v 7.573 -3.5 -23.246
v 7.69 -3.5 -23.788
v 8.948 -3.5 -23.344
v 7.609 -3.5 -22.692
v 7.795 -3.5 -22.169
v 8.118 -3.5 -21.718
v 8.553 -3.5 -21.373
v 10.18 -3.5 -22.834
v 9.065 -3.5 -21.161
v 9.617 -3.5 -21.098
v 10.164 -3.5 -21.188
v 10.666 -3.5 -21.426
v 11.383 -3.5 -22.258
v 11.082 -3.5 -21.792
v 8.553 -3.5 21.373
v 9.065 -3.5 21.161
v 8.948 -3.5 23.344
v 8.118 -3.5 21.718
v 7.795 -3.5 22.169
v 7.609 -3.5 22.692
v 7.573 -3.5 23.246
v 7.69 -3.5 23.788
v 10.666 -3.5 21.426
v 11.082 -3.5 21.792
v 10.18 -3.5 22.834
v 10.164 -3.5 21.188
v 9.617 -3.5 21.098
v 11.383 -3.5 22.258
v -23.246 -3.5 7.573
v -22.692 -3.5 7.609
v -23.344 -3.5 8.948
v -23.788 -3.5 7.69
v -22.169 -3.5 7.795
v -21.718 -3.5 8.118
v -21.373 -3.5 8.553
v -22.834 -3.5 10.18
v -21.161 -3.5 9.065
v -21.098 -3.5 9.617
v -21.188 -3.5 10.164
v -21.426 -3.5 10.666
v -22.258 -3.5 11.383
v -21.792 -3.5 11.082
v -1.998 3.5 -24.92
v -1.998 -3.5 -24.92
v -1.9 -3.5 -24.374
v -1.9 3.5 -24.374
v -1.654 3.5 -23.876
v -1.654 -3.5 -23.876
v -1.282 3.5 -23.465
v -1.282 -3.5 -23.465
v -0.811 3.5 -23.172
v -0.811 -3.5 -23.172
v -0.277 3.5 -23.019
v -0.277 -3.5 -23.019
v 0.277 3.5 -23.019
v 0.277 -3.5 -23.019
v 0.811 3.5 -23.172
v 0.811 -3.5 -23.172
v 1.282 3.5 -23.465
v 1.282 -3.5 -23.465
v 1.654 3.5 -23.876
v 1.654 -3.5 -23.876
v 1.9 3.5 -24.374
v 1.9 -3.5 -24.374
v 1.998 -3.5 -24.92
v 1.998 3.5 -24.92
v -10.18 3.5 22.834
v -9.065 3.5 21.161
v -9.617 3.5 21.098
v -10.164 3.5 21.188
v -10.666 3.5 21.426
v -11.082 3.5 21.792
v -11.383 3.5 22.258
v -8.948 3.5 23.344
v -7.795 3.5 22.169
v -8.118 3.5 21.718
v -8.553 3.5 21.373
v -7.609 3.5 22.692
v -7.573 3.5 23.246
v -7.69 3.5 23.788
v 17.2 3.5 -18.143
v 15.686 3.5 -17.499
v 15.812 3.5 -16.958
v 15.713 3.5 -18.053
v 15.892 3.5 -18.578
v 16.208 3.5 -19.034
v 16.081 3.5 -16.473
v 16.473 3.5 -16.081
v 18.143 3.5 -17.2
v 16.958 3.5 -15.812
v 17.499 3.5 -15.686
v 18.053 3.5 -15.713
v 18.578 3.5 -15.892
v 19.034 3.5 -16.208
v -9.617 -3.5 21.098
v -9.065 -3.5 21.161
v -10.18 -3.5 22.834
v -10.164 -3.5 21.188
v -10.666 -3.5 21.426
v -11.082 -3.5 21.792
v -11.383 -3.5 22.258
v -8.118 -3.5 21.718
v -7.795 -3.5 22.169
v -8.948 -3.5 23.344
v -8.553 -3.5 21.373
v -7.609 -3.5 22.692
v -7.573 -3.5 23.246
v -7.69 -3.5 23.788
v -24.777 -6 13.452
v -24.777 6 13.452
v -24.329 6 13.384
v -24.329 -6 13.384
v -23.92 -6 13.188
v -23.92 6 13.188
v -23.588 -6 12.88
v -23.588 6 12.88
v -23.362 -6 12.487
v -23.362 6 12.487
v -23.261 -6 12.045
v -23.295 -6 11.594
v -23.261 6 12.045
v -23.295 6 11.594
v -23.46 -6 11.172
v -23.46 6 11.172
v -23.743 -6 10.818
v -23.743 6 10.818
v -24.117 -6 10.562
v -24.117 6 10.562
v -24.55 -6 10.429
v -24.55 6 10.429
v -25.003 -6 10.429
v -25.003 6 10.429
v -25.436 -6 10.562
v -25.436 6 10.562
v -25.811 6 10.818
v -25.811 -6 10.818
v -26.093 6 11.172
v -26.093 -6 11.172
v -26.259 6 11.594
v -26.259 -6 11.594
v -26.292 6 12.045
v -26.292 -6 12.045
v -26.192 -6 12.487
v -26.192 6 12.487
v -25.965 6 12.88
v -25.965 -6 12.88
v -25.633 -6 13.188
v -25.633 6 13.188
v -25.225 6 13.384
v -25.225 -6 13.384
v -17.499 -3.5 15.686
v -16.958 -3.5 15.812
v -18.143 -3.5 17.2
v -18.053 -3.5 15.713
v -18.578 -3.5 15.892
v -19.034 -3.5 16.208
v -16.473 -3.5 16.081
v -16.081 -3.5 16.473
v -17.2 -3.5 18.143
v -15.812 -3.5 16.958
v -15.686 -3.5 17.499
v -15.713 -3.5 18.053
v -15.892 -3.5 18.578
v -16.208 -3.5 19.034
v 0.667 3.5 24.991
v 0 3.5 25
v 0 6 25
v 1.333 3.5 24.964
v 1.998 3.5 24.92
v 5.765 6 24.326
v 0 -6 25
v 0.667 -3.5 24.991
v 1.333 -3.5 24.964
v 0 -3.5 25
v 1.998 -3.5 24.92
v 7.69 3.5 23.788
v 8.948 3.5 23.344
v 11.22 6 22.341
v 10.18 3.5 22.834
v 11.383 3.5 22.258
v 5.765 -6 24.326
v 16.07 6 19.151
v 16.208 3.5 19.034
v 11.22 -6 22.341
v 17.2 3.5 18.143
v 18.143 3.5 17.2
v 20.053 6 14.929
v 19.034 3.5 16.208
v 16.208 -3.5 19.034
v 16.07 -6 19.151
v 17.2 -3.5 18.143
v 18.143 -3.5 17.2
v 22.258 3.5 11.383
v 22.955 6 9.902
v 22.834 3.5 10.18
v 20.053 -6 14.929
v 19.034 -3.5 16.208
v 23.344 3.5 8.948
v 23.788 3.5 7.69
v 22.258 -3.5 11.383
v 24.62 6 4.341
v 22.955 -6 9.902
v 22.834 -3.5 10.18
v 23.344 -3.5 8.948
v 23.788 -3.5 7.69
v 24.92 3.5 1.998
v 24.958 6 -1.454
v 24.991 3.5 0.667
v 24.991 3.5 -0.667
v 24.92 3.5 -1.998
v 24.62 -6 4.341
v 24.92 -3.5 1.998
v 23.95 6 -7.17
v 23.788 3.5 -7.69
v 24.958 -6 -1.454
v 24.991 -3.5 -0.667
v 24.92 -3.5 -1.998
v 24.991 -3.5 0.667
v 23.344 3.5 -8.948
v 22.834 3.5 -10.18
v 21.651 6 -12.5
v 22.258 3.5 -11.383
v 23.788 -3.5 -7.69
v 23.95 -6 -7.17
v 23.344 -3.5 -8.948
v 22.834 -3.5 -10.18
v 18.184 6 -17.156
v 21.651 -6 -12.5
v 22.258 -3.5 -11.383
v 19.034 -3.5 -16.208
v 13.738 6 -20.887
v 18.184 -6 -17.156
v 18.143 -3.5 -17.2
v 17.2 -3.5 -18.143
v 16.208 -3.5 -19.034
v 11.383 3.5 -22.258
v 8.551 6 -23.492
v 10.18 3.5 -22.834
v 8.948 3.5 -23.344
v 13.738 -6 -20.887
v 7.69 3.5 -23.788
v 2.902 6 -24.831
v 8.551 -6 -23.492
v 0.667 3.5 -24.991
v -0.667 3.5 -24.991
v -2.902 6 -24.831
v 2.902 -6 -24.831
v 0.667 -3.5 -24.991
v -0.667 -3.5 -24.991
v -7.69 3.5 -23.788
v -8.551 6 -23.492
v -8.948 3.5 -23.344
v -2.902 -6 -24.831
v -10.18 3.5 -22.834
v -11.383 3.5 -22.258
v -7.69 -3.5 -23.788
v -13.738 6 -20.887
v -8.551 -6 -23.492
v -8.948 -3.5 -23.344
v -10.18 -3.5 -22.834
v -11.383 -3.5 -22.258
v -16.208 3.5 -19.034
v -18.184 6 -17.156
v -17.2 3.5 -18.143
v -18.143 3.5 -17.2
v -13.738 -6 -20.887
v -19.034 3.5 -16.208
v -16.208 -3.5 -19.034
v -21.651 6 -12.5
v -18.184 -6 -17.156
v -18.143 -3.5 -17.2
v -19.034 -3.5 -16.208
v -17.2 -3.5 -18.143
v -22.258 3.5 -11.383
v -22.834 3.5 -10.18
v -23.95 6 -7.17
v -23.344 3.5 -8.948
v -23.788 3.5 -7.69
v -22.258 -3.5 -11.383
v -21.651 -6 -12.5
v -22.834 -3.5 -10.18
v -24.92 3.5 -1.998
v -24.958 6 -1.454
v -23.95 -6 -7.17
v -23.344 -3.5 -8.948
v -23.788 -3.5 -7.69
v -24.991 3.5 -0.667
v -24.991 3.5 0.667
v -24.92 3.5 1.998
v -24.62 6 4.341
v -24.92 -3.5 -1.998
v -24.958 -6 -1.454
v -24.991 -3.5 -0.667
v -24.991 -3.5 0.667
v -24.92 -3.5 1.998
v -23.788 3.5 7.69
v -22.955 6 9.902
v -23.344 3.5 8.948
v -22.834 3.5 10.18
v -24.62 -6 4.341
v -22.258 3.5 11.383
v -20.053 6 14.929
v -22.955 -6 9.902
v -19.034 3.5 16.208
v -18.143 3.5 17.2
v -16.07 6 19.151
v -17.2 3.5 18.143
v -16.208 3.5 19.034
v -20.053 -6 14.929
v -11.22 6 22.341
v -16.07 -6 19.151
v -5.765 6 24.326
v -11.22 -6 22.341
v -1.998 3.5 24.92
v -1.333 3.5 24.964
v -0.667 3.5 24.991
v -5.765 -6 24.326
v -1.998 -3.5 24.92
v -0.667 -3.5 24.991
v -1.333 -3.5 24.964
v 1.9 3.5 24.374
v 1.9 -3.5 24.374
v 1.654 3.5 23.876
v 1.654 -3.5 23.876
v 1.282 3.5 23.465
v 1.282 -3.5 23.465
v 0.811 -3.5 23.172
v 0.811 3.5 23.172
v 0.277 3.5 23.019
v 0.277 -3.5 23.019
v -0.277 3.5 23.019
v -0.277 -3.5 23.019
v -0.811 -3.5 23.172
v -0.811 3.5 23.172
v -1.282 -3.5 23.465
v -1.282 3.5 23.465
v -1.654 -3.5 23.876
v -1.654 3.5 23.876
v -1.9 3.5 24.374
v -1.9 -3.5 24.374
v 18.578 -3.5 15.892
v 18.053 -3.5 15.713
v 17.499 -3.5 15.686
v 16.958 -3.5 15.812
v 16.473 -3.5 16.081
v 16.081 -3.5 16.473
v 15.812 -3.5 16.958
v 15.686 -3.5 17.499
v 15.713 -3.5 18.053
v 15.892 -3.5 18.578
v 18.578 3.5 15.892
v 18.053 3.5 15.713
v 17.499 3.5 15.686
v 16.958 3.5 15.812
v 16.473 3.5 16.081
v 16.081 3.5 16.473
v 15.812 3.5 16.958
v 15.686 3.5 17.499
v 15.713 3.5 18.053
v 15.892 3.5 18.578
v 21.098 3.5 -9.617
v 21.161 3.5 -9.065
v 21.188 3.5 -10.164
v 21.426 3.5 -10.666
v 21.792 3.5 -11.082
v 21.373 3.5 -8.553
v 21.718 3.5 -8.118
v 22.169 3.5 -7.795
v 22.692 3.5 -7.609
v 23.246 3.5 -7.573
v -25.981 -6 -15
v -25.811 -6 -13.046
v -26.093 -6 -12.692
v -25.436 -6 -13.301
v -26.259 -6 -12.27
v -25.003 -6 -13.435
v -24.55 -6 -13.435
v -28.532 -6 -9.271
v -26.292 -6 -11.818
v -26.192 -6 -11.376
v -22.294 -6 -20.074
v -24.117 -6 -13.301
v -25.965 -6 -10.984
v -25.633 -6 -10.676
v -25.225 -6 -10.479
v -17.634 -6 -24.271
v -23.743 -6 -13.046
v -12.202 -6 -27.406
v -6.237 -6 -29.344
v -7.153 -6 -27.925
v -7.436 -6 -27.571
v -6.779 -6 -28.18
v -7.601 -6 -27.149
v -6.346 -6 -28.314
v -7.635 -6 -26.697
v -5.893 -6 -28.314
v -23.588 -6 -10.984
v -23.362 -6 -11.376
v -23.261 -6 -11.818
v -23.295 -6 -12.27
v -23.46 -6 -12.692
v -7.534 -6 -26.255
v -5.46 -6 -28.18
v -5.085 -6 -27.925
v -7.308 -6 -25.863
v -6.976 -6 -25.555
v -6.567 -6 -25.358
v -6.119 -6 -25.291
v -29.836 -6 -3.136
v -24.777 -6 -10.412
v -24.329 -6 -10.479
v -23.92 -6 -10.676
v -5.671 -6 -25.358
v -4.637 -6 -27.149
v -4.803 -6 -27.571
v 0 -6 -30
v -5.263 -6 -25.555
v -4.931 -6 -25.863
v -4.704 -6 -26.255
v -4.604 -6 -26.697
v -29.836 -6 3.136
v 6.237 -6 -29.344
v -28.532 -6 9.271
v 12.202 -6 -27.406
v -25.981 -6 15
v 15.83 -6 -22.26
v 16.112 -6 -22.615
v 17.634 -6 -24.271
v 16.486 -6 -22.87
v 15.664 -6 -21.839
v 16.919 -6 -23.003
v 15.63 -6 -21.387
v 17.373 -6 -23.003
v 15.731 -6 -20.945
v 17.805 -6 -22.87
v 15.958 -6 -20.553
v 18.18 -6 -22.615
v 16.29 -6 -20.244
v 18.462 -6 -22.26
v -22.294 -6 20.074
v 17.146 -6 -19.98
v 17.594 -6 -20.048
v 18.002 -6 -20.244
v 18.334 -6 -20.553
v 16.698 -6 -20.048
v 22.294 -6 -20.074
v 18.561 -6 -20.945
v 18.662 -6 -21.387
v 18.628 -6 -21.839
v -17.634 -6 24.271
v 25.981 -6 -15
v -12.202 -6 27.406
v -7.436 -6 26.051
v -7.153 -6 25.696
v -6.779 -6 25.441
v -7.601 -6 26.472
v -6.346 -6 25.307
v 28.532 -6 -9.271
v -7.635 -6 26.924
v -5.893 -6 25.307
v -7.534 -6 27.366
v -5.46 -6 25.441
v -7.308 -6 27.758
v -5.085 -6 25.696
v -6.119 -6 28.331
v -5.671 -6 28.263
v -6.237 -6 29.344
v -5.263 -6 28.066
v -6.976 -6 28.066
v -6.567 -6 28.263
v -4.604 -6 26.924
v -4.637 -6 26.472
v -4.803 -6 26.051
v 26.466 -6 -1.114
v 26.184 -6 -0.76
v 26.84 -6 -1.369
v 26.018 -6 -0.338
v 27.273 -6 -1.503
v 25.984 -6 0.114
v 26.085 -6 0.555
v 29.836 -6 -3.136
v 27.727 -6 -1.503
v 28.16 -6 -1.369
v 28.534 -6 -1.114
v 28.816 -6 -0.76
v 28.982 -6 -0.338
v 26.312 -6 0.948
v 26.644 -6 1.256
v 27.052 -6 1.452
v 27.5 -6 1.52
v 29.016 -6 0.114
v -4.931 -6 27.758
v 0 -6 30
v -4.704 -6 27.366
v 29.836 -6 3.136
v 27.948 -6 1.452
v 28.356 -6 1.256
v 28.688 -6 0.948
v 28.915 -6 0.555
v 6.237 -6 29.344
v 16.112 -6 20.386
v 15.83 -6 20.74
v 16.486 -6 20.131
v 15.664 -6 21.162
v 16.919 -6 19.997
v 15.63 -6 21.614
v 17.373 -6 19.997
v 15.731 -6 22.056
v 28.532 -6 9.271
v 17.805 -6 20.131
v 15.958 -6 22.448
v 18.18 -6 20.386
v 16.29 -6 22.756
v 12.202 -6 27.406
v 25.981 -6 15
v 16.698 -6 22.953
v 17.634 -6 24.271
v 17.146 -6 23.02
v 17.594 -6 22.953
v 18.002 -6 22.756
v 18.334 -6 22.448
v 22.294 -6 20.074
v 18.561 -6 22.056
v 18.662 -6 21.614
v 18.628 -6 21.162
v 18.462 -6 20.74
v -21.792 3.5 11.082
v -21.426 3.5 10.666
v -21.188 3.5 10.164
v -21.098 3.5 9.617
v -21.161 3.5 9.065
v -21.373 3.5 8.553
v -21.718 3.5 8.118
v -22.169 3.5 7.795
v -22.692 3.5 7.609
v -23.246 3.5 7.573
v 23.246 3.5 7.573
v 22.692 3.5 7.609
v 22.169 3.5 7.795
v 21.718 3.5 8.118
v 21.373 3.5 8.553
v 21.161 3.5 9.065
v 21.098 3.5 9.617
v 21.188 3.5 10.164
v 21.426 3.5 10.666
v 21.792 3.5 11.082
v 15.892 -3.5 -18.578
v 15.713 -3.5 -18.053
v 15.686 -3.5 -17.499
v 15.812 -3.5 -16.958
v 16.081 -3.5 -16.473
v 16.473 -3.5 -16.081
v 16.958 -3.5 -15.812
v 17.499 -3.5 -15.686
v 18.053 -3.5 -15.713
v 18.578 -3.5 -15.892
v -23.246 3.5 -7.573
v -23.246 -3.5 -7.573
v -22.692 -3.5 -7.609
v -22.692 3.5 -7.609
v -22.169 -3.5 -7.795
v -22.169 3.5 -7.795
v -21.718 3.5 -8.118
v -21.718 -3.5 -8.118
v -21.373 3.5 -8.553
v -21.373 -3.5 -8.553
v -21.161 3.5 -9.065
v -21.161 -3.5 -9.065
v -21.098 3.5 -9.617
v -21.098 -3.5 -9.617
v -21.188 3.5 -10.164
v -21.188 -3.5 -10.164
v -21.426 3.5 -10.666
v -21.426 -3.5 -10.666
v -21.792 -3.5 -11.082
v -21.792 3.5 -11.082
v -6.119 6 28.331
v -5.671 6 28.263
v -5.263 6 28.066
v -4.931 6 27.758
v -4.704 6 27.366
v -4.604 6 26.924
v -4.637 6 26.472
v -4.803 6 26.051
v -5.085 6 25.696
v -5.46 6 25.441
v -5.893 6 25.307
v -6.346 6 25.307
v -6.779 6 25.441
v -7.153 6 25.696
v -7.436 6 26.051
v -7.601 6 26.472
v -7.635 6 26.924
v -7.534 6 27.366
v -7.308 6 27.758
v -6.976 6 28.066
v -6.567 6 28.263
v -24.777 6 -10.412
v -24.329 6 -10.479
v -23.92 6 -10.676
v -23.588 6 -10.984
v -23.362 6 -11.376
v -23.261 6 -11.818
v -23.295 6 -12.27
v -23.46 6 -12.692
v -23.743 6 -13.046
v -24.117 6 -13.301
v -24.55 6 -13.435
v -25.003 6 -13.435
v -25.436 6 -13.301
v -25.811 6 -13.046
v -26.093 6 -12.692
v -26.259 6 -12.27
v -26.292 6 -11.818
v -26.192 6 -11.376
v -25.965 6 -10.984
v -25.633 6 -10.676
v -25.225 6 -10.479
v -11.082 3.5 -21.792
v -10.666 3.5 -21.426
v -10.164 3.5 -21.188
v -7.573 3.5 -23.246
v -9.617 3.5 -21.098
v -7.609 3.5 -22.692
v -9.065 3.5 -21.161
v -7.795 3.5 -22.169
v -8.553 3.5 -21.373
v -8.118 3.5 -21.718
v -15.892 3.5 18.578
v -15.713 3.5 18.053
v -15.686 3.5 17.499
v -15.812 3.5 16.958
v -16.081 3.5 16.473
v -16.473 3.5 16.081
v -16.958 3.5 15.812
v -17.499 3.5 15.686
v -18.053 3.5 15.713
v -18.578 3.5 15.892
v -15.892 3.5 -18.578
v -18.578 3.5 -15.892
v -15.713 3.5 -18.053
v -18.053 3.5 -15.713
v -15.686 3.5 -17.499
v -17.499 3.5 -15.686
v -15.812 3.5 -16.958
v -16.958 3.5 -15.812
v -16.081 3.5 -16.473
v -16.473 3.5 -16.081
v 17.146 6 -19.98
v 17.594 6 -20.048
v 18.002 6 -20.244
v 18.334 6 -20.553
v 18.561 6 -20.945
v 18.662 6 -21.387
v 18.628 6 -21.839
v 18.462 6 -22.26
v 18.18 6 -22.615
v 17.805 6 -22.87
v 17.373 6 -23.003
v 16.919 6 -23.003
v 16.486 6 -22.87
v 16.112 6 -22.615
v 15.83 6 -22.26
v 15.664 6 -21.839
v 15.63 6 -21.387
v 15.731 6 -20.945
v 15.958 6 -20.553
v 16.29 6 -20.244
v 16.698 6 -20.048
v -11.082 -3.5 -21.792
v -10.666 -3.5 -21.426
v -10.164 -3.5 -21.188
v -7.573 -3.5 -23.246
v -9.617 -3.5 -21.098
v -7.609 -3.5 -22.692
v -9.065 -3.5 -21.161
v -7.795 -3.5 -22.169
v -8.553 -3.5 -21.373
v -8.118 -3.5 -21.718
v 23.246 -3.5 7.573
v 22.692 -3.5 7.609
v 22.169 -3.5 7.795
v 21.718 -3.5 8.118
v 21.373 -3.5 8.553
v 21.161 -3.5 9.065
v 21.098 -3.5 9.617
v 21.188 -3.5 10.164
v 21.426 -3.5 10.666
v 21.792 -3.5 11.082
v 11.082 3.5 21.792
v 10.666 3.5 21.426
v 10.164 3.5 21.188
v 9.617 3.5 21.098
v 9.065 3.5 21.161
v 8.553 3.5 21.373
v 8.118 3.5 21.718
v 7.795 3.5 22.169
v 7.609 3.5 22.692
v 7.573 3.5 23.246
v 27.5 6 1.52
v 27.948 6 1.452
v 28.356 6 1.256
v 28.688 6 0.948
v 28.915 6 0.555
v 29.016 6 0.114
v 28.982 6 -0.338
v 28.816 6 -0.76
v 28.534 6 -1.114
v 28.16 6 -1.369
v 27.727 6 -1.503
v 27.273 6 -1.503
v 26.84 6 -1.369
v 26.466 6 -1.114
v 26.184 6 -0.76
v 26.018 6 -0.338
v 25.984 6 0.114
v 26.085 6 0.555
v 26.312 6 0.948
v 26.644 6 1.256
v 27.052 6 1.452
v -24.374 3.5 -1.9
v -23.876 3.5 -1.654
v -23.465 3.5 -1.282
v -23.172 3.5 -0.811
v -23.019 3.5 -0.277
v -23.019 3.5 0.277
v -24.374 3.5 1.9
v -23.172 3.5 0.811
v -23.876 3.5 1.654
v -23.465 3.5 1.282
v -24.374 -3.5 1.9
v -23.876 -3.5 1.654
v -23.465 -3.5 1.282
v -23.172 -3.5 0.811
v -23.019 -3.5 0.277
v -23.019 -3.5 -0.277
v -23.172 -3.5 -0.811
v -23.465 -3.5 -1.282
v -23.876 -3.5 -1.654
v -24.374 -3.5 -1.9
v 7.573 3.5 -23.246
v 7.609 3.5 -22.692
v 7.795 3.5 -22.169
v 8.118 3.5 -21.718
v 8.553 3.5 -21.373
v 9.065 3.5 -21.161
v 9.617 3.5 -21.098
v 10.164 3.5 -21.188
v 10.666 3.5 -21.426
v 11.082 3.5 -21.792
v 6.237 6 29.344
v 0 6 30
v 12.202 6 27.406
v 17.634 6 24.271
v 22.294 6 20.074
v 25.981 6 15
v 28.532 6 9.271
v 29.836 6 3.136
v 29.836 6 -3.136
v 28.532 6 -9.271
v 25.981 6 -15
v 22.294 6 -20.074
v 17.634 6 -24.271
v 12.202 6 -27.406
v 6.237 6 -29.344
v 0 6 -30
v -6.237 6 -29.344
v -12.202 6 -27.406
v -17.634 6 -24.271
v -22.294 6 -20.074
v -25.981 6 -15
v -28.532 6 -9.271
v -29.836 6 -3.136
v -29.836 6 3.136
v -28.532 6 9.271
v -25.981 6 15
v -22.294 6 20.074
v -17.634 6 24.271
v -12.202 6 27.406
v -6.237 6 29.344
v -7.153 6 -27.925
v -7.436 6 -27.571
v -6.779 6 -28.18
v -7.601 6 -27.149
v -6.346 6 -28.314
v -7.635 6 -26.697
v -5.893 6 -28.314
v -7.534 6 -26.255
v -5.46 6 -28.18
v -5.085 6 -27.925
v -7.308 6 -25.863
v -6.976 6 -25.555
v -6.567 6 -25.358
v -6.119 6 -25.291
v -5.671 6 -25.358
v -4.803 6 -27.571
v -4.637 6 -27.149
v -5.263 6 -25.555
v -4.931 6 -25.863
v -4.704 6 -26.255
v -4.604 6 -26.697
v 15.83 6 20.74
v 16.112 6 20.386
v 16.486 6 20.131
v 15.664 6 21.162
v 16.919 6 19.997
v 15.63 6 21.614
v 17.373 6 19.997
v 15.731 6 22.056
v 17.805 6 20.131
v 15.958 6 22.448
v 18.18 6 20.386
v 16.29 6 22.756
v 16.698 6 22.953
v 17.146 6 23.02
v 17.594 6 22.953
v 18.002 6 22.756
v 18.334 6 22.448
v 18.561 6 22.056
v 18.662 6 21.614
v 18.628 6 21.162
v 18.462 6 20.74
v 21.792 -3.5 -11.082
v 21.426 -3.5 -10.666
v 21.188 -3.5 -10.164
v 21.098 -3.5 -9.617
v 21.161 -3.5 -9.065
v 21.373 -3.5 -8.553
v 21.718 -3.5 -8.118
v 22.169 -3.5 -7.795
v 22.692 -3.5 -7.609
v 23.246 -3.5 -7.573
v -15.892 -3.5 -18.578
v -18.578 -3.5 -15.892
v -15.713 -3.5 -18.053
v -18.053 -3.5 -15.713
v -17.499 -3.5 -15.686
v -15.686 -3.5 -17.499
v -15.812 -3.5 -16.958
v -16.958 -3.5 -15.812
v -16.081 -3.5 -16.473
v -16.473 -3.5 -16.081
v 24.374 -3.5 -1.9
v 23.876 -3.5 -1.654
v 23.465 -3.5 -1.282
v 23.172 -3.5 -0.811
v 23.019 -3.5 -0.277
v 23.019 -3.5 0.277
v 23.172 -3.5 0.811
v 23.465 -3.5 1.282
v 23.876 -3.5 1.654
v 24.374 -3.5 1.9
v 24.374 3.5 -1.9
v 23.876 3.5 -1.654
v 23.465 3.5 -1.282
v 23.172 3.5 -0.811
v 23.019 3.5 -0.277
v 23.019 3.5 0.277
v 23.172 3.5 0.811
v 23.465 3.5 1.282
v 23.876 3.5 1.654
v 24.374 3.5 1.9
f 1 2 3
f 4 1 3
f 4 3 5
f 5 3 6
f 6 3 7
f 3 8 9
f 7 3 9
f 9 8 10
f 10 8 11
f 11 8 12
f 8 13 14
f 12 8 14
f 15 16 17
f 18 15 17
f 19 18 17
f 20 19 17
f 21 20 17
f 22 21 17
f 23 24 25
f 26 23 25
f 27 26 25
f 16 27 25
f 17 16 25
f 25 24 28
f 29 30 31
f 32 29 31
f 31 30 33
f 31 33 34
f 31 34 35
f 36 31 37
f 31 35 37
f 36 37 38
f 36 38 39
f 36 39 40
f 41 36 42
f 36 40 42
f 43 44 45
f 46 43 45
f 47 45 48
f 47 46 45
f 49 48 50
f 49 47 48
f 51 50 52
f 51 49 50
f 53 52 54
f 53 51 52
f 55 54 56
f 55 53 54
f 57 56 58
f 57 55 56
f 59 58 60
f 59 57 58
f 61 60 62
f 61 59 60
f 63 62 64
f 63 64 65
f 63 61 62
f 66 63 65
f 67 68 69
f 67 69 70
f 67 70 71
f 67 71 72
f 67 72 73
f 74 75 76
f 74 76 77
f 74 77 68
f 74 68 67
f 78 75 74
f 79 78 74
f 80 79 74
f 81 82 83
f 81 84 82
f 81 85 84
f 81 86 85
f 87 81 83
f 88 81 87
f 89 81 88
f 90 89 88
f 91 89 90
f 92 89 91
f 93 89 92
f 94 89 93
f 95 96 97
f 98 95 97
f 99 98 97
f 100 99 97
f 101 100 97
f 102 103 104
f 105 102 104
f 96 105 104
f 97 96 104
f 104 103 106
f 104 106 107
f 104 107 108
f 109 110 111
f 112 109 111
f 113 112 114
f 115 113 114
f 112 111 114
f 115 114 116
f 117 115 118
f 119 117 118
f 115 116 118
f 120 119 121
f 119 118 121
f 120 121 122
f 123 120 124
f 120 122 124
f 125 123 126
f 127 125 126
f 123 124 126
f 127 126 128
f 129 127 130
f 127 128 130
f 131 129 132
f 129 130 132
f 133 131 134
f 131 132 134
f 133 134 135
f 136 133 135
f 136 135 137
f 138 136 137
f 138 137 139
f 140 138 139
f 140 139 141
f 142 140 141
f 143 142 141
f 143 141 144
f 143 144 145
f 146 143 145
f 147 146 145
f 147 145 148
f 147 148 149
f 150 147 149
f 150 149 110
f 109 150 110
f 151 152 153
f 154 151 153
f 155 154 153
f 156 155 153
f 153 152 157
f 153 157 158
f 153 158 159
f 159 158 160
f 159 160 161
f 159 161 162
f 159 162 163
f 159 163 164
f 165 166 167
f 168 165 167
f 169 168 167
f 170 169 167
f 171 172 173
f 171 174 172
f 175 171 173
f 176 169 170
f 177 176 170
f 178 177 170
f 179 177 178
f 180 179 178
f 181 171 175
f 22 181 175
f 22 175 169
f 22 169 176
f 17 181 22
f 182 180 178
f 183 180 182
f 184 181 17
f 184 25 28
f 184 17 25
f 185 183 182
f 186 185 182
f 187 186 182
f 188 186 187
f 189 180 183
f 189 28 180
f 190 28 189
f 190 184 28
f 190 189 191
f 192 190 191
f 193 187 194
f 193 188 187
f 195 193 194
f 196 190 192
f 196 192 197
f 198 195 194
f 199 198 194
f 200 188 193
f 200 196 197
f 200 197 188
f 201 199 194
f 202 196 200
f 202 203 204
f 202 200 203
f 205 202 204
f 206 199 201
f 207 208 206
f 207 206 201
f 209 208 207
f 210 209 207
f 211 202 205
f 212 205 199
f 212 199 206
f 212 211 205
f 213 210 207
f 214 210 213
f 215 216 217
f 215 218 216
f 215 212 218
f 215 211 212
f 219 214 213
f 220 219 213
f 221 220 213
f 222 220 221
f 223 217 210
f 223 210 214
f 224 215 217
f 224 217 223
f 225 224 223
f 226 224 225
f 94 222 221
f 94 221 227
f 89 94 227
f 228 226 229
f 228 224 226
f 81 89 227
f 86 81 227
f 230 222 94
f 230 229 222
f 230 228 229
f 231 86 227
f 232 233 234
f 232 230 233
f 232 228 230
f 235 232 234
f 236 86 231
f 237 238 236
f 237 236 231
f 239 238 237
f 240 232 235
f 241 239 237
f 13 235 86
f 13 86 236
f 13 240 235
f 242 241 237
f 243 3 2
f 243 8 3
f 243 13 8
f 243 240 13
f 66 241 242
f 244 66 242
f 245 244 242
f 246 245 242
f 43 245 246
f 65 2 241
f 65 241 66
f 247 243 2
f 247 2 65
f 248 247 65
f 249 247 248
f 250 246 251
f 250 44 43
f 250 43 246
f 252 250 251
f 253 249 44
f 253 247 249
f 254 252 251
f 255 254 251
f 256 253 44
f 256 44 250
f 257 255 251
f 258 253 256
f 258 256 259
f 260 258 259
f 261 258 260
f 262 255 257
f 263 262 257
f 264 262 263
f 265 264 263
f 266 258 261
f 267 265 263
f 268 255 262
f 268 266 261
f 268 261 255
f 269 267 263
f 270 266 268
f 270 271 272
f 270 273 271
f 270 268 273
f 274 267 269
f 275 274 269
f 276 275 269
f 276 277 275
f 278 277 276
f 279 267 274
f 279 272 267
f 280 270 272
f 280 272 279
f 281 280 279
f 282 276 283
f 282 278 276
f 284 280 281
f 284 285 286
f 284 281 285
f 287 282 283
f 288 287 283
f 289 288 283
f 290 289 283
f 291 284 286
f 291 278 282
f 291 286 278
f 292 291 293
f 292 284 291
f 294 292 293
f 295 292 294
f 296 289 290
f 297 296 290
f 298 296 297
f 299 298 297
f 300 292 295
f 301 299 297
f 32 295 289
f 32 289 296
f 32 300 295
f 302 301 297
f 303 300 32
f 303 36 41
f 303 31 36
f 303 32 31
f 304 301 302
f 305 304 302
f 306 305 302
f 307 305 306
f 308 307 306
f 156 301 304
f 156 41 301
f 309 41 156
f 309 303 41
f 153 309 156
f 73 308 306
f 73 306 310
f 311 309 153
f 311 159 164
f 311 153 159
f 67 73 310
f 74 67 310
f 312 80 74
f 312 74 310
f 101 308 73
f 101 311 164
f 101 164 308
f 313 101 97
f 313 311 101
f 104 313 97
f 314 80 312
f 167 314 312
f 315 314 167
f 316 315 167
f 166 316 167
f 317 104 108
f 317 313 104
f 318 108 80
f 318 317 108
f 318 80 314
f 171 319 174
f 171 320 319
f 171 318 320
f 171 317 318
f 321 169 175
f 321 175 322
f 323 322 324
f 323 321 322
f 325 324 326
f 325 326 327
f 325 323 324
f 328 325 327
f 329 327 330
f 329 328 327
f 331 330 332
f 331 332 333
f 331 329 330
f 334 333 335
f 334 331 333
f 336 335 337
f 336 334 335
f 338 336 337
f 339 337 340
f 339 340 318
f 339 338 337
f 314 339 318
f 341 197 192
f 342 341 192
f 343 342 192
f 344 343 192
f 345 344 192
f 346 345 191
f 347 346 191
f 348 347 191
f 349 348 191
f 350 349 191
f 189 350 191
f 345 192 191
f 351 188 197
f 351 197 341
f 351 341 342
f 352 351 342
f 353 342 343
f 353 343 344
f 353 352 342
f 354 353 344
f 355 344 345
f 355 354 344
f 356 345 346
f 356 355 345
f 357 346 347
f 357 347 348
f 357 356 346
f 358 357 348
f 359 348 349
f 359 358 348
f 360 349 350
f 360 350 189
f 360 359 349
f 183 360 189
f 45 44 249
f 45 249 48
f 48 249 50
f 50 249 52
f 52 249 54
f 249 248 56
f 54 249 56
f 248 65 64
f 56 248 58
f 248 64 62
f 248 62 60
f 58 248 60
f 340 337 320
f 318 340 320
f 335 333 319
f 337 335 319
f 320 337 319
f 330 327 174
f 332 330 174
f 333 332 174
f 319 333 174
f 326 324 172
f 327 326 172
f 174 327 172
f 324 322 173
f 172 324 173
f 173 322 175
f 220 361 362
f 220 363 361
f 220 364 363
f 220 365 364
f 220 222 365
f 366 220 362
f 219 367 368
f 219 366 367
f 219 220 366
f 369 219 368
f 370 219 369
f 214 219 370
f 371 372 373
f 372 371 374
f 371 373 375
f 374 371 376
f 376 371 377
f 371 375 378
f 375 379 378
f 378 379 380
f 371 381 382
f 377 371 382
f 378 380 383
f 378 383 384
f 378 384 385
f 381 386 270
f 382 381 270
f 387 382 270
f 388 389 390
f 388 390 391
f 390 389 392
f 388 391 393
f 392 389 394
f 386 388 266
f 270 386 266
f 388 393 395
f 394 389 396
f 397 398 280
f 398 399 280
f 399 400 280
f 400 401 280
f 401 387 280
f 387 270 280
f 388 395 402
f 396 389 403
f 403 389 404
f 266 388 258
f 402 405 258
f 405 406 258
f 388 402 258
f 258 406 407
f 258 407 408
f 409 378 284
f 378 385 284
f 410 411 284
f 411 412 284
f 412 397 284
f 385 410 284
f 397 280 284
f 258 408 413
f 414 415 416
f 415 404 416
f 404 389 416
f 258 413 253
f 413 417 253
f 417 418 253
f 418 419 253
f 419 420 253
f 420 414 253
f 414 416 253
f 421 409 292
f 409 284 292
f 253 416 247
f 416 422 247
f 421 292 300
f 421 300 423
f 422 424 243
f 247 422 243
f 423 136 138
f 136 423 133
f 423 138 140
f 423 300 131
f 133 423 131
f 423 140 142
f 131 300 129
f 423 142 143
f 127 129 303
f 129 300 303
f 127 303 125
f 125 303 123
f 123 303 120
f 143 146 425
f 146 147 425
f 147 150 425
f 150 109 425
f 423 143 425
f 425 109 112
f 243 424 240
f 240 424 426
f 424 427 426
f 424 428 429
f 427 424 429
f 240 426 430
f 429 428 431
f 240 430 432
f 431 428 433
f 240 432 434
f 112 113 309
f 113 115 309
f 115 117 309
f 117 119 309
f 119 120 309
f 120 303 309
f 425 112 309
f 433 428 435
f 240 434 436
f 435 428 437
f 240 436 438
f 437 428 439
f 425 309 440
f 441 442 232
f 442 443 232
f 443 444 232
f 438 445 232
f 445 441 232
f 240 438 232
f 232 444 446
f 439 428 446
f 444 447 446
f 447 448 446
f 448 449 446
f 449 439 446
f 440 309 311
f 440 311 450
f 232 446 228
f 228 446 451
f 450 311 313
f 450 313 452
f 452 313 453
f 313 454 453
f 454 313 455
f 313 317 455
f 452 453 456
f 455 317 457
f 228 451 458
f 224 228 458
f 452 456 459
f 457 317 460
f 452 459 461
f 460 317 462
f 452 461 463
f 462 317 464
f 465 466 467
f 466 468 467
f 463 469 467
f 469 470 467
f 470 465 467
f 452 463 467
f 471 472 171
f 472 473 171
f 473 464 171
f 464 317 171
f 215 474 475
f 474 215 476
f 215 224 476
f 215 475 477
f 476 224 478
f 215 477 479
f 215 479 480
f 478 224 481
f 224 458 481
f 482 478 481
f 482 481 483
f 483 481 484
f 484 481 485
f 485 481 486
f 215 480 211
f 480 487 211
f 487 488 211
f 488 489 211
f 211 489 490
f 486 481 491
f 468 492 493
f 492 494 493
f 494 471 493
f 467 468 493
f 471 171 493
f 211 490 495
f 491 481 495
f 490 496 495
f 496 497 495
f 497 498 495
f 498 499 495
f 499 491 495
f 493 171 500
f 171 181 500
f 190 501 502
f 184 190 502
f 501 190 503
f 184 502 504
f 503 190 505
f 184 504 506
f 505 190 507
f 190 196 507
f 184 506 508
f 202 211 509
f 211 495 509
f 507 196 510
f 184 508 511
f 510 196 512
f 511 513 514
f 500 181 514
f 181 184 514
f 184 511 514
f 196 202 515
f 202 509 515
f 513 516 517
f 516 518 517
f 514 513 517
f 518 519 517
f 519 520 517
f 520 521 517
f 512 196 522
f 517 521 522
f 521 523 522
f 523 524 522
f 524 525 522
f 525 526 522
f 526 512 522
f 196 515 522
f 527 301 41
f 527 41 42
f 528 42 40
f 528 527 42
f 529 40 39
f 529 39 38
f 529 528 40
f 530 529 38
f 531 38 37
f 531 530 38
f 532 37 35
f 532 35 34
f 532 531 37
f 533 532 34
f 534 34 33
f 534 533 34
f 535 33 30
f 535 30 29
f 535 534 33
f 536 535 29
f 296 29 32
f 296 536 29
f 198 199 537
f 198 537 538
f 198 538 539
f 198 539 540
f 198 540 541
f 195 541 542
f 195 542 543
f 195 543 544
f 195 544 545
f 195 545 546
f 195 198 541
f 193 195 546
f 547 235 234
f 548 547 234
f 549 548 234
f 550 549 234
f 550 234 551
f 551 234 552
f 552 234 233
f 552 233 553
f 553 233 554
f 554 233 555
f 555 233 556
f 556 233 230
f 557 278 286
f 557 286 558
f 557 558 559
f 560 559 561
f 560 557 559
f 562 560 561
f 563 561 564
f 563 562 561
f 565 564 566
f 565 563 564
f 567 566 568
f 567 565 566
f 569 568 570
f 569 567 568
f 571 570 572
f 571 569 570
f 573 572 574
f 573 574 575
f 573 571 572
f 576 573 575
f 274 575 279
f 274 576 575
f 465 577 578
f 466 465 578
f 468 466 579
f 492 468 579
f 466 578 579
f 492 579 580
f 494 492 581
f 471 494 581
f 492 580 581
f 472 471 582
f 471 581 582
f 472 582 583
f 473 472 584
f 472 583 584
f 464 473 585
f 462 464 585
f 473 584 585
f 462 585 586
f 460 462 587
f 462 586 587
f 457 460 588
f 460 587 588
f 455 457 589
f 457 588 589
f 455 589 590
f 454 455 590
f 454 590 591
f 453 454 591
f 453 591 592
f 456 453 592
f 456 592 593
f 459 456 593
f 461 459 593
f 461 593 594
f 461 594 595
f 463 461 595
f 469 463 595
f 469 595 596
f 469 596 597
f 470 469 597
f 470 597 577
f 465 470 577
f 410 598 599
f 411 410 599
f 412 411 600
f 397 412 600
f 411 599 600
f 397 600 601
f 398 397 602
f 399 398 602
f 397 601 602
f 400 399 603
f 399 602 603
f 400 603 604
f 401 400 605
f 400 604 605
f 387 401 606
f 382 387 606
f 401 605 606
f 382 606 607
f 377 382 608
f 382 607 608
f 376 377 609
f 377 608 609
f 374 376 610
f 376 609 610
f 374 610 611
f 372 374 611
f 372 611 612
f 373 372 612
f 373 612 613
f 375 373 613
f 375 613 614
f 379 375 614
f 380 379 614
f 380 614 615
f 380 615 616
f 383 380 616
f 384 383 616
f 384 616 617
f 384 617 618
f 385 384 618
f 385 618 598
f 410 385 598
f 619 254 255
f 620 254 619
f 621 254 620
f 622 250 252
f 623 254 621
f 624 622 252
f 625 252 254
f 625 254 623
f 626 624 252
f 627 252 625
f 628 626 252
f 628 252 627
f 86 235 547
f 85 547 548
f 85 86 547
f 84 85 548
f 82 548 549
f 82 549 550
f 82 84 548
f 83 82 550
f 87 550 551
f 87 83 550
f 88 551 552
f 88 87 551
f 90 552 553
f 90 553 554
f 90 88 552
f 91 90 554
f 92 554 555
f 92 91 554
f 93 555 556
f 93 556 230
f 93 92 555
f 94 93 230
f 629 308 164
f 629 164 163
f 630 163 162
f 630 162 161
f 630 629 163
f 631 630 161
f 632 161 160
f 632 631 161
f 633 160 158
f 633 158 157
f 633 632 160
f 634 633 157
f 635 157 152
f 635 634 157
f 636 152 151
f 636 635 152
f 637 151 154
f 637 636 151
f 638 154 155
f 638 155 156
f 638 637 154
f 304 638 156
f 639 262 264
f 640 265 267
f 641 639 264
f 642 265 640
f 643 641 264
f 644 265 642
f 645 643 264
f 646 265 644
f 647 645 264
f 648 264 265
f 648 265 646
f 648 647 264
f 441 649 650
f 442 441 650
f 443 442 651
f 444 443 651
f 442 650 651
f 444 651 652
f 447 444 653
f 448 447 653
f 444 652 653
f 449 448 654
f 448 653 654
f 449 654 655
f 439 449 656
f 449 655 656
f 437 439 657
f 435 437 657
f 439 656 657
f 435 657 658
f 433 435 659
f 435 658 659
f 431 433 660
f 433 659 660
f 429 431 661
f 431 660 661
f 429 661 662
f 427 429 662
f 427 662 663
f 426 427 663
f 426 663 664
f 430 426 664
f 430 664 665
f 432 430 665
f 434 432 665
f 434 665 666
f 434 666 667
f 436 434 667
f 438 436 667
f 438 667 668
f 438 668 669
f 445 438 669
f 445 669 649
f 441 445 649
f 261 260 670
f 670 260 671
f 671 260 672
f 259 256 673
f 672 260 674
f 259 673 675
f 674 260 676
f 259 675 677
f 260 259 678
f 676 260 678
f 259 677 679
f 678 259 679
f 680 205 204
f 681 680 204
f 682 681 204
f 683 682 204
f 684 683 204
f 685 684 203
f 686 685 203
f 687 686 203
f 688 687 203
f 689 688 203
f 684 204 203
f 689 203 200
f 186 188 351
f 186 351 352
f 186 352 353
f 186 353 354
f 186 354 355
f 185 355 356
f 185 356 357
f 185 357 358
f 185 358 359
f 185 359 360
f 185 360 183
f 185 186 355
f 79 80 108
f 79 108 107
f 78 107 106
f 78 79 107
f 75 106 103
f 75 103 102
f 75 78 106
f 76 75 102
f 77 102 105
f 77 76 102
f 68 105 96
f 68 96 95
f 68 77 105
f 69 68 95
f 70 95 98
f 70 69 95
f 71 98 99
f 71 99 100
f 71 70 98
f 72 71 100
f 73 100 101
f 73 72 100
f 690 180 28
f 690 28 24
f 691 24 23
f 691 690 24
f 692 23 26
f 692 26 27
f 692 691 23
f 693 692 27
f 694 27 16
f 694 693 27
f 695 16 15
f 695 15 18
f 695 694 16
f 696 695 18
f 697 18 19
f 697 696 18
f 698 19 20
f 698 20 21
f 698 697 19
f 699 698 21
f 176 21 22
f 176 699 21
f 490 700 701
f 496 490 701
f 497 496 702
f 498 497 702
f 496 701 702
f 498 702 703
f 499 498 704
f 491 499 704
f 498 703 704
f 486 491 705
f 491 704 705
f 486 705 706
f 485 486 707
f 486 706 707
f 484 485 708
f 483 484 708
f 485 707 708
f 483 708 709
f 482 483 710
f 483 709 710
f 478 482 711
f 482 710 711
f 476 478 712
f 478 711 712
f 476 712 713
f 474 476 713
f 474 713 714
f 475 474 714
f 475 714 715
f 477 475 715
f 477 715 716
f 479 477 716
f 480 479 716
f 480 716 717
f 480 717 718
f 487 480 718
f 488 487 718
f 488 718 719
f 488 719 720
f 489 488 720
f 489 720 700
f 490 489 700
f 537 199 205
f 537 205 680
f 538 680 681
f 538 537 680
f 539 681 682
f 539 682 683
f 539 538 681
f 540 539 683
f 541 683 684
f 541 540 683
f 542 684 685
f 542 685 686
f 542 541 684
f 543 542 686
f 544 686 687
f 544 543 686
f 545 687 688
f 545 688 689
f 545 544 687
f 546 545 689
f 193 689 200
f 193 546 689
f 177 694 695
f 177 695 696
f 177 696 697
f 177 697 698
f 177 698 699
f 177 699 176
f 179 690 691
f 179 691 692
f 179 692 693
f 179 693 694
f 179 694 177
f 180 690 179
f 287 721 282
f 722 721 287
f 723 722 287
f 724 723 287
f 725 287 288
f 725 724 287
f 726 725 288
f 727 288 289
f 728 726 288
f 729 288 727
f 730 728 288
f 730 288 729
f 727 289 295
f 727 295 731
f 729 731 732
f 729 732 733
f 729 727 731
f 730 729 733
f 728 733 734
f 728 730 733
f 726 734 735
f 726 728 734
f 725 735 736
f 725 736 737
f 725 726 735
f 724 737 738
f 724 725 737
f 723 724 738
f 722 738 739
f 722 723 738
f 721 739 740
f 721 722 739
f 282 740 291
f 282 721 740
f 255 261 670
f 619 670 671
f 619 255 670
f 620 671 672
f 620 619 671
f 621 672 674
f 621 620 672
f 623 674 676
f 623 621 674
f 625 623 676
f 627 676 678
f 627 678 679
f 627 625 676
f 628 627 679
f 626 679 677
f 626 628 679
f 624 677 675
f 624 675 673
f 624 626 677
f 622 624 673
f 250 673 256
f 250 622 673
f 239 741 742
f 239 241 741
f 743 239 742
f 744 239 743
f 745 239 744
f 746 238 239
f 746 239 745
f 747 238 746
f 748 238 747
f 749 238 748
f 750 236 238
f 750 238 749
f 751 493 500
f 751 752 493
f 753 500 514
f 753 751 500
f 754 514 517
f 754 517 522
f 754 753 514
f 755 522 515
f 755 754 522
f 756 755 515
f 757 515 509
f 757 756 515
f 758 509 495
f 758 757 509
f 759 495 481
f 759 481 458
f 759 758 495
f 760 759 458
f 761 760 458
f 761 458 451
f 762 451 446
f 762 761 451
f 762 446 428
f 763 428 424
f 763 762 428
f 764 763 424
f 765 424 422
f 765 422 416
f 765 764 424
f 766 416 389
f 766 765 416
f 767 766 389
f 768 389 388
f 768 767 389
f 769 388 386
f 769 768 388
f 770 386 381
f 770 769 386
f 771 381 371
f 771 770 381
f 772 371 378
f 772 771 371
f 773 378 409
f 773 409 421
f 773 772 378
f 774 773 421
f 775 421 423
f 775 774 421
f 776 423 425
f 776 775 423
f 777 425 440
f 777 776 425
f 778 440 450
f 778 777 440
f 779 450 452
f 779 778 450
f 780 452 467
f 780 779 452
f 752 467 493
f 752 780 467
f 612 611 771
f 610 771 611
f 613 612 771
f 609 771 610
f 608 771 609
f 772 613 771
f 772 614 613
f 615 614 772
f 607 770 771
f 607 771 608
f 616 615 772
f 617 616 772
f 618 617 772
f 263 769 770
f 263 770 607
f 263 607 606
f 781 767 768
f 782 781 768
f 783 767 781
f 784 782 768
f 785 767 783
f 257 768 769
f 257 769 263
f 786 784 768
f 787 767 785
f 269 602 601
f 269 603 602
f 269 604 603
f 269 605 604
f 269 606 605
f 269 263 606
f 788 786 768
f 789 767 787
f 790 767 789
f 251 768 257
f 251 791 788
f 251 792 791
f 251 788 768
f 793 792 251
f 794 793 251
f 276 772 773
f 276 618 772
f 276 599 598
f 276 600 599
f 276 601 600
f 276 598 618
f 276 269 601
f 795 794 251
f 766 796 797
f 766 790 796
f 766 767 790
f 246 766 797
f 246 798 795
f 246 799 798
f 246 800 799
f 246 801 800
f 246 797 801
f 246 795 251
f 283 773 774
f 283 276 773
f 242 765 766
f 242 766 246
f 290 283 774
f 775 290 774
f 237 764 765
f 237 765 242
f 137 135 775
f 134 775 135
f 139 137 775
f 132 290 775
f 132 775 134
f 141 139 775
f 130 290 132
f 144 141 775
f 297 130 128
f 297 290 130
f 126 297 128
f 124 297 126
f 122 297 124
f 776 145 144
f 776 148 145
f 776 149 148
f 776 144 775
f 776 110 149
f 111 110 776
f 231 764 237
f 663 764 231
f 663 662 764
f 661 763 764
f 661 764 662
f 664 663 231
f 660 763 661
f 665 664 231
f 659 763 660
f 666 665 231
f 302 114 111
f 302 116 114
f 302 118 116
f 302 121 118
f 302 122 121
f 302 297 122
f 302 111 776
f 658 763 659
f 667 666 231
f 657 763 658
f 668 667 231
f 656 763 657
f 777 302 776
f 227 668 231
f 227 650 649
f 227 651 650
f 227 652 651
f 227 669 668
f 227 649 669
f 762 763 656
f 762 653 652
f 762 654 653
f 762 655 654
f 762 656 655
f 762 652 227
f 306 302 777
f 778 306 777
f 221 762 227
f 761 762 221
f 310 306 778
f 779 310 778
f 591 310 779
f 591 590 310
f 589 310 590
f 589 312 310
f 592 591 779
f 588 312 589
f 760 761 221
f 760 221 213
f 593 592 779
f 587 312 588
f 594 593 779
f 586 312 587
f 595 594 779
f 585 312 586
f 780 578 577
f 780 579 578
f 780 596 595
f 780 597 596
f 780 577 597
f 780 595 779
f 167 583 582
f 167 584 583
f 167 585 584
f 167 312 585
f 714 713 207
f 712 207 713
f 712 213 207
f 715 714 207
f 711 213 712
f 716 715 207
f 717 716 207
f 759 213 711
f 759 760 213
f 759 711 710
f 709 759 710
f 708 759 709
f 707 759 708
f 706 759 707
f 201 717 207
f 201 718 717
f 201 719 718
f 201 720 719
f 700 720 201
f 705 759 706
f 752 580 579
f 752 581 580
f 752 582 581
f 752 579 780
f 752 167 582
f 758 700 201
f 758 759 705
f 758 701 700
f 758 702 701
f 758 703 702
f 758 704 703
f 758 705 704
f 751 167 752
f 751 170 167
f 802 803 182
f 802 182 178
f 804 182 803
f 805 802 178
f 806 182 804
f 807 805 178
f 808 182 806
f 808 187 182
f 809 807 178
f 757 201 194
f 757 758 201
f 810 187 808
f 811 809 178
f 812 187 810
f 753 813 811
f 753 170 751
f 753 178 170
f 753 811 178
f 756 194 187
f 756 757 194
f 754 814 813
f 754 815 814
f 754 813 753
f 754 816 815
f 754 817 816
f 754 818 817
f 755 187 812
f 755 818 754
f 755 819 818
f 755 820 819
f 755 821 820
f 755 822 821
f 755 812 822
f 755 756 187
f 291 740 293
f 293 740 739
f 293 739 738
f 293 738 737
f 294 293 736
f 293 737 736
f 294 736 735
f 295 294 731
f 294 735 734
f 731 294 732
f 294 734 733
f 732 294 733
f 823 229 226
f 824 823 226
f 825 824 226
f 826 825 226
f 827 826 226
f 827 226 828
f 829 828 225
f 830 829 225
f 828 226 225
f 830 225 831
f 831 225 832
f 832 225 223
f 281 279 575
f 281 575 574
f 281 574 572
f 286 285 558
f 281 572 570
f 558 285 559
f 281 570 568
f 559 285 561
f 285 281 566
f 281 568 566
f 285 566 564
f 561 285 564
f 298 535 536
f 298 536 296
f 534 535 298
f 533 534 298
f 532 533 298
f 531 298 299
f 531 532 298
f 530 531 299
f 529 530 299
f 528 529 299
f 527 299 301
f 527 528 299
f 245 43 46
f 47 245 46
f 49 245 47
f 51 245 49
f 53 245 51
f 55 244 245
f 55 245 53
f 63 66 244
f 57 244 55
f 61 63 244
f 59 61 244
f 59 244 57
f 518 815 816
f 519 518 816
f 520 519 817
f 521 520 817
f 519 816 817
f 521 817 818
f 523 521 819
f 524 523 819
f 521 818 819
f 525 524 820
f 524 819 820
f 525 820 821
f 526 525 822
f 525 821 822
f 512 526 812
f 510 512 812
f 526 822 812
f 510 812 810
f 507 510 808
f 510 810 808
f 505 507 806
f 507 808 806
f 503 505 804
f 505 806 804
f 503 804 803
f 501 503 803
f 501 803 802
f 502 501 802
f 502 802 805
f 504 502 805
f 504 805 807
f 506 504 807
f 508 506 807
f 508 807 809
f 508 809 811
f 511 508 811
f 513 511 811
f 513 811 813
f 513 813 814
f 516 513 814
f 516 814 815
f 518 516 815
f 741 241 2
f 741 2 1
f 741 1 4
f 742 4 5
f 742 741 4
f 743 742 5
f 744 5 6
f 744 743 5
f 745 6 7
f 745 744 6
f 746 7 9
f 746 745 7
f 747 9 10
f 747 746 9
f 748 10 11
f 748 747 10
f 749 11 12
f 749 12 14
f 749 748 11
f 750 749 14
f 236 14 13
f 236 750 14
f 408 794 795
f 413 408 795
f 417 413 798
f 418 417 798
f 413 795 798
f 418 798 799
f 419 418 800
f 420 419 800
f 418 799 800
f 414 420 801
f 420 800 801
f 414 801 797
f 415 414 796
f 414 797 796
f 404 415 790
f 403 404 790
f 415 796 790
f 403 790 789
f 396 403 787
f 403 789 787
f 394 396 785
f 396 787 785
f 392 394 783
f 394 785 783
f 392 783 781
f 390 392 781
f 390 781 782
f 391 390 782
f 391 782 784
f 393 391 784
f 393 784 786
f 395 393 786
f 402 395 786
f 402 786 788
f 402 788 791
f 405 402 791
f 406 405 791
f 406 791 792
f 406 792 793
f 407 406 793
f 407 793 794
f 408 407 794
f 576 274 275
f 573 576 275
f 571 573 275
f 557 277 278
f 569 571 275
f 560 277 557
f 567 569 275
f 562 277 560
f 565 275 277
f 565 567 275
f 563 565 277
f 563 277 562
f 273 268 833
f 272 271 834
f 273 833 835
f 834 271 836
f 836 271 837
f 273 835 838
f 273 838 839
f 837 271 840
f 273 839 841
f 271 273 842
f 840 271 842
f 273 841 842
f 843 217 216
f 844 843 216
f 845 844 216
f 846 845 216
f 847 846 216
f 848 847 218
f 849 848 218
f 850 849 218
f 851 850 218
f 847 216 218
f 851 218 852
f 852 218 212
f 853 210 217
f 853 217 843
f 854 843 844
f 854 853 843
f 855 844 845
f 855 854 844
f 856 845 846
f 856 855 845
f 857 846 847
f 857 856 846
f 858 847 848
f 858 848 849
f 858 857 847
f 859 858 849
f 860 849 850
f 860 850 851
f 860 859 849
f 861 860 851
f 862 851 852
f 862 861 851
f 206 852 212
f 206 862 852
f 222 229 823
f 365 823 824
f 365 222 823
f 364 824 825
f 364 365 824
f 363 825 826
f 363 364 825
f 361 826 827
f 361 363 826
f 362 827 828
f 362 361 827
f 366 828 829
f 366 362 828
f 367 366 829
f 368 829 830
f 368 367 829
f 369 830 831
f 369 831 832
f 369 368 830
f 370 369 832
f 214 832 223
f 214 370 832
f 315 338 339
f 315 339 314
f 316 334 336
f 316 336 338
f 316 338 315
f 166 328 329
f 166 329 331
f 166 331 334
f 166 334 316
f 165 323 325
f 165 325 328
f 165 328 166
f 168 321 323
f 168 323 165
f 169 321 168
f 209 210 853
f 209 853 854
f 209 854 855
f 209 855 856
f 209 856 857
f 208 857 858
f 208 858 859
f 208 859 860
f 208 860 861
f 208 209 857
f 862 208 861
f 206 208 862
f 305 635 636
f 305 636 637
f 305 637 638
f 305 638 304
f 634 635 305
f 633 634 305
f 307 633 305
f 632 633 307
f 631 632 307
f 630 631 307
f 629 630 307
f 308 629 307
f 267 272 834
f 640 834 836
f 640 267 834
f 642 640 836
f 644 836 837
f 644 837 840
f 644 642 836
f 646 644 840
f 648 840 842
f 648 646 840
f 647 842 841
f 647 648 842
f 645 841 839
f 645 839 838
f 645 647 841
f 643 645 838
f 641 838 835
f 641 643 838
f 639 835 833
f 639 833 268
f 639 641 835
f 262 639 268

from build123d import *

# Parameters (mm, degrees)
CROQUIS1_R                 = 2
SALIENTE_EXTRUIR1_DEPTH    = 3.5
SALIENTE_EXTRUIR1_2_DEPTH  = 3.5
SALIENTE_EXTRUIR1_3_DEPTH  = 3.5
SALIENTE_EXTRUIR1_4_DEPTH  = 3.5
SALIENTE_EXTRUIR1_5_DEPTH  = 3.5
SALIENTE_EXTRUIR1_6_DEPTH  = 3.5
SALIENTE_EXTRUIR1_7_DEPTH  = 3.5
SALIENTE_EXTRUIR1_8_DEPTH  = 3.5
SALIENTE_EXTRUIR1_9_DEPTH  = 3.5
SALIENTE_EXTRUIR1_10_DEPTH = 3.5
SALIENTE_EXTRUIR1_11_DEPTH = 3.5
SALIENTE_EXTRUIR1_12_DEPTH = 3.5
SALIENTE_EXTRUIR1_13_DEPTH = 3.5
SALIENTE_EXTRUIR1_14_DEPTH = 3.5
SALIENTE_EXTRUIR1_15_DEPTH = 3.5
SALIENTE_EXTRUIR1_16_DEPTH = 3.5
CROQUIS3_R                 = 30
CROQUIS3_R_2               = 25
SALIENTE_EXTRUIR2_DEPTH    = 6
CROQUIS4_R                 = 1.52
CORTAR_EXTRUIR1_DEPTH      = 45.09081537


with BuildPart() as part:
    # Croquis1 → Saliente-Extruir1 (new, symmetric)
    with BuildSketch(Plane(origin=(0, 0, 0), x_dir=(1, 0, 0), z_dir=(0, 1, 0))):
        with Locations(Location((25, 0, 0), (0, 0, 270))):
            Circle(CROQUIS1_R)
    extrude(amount=SALIENTE_EXTRUIR1_DEPTH, both=True)



with BuildPart() as body_2:
    # Croquis1 → Saliente-Extruir1 2 (new, symmetric)
    with BuildSketch(Plane(origin=(0, 0, 0), x_dir=(1, 0, 0), z_dir=(0, 1, 0))):
        with Locations(Location((23.096988313, -9.567085809, 0), (0, 0, 270))):
            Circle(CROQUIS1_R)
    extrude(amount=SALIENTE_EXTRUIR1_2_DEPTH, both=True)


with BuildPart() as body_3:
    # Croquis1 → Saliente-Extruir1 3 (new, symmetric)
    with BuildSketch(Plane(origin=(0, 0, 0), x_dir=(1, 0, 0), z_dir=(0, 1, 0))):
        with Locations(Location((17.67766953, -17.67766953, 0), (0, 0, 270))):
            Circle(CROQUIS1_R)
    extrude(amount=SALIENTE_EXTRUIR1_3_DEPTH, both=True)


with BuildPart() as body_4:
    # Croquis1 → Saliente-Extruir1 4 (new, symmetric)
    with BuildSketch(Plane(origin=(0, 0, 0), x_dir=(1, 0, 0), z_dir=(0, 1, 0))):
        with Locations(Location((9.567085809, -23.096988313, 0), (0, 0, 270))):
            Circle(CROQUIS1_R)
    extrude(amount=SALIENTE_EXTRUIR1_4_DEPTH, both=True)


with BuildPart() as body_5:
    # Croquis1 → Saliente-Extruir1 5 (new, symmetric)
    with BuildSketch(Plane(origin=(0, 0, 0), x_dir=(1, 0, 0), z_dir=(0, 1, 0))):
        with Locations(Location((0, -25, 0), (0, 0, 270))):
            Circle(CROQUIS1_R)
    extrude(amount=SALIENTE_EXTRUIR1_5_DEPTH, both=True)


with BuildPart() as body_6:
    # Croquis1 → Saliente-Extruir1 6 (new, symmetric)
    with BuildSketch(Plane(origin=(0, 0, 0), x_dir=(1, 0, 0), z_dir=(0, 1, 0))):
        with Locations(Location((-9.567085809, -23.096988313, 0), (0, 0, 270))):
            Circle(CROQUIS1_R)
    extrude(amount=SALIENTE_EXTRUIR1_6_DEPTH, both=True)


with BuildPart() as body_7:
    # Croquis1 → Saliente-Extruir1 7 (new, symmetric)
    with BuildSketch(Plane(origin=(0, 0, 0), x_dir=(1, 0, 0), z_dir=(0, 1, 0))):
        with Locations(Location((-17.67766953, -17.67766953, 0), (0, 0, 270))):
            Circle(CROQUIS1_R)
    extrude(amount=SALIENTE_EXTRUIR1_7_DEPTH, both=True)


with BuildPart() as body_8:
    # Croquis1 → Saliente-Extruir1 8 (new, symmetric)
    with BuildSketch(Plane(origin=(0, 0, 0), x_dir=(1, 0, 0), z_dir=(0, 1, 0))):
        with Locations(Location((-23.096988313, -9.567085809, 0), (0, 0, 270))):
            Circle(CROQUIS1_R)
    extrude(amount=SALIENTE_EXTRUIR1_8_DEPTH, both=True)


with BuildPart() as body_9:
    # Croquis1 → Saliente-Extruir1 9 (new, symmetric)
    with BuildSketch(Plane(origin=(0, 0, 0), x_dir=(1, 0, 0), z_dir=(0, 1, 0))):
        with Locations(Location((-25, 0, 0), (0, 0, 270))):
            Circle(CROQUIS1_R)
    extrude(amount=SALIENTE_EXTRUIR1_9_DEPTH, both=True)


with BuildPart() as body_10:
    # Croquis1 → Saliente-Extruir1 10 (new, symmetric)
    with BuildSketch(Plane(origin=(0, 0, 0), x_dir=(1, 0, 0), z_dir=(0, 1, 0))):
        with Locations(Location((-23.096988313, 9.567085809, 0), (0, 0, 270))):
            Circle(CROQUIS1_R)
    extrude(amount=SALIENTE_EXTRUIR1_10_DEPTH, both=True)


with BuildPart() as body_11:
    # Croquis1 → Saliente-Extruir1 11 (new, symmetric)
    with BuildSketch(Plane(origin=(0, 0, 0), x_dir=(1, 0, 0), z_dir=(0, 1, 0))):
        with Locations(Location((-17.67766953, 17.67766953, 0), (0, 0, 270))):
            Circle(CROQUIS1_R)
    extrude(amount=SALIENTE_EXTRUIR1_11_DEPTH, both=True)


with BuildPart() as body_12:
    # Croquis1 → Saliente-Extruir1 12 (new, symmetric)
    with BuildSketch(Plane(origin=(0, 0, 0), x_dir=(1, 0, 0), z_dir=(0, 1, 0))):
        with Locations(Location((-9.567085809, 23.096988313, 0), (0, 0, 270))):
            Circle(CROQUIS1_R)
    extrude(amount=SALIENTE_EXTRUIR1_12_DEPTH, both=True)


with BuildPart() as body_13:
    # Croquis1 → Saliente-Extruir1 13 (new, symmetric)
    with BuildSketch(Plane(origin=(0, 0, 0), x_dir=(1, 0, 0), z_dir=(0, 1, 0))):
        with Locations(Location((0, 25, 0), (0, 0, 270))):
            Circle(CROQUIS1_R)
    extrude(amount=SALIENTE_EXTRUIR1_13_DEPTH, both=True)


with BuildPart() as body_14:
    # Croquis1 → Saliente-Extruir1 14 (new, symmetric)
    with BuildSketch(Plane(origin=(0, 0, 0), x_dir=(1, 0, 0), z_dir=(0, 1, 0))):
        with Locations(Location((9.567085809, 23.096988313, 0), (0, 0, 270))):
            Circle(CROQUIS1_R)
    extrude(amount=SALIENTE_EXTRUIR1_14_DEPTH, both=True)


with BuildPart() as body_15:
    # Croquis1 → Saliente-Extruir1 15 (new, symmetric)
    with BuildSketch(Plane(origin=(0, 0, 0), x_dir=(1, 0, 0), z_dir=(0, 1, 0))):
        with Locations(Location((17.67766953, 17.67766953, 0), (0, 0, 270))):
            Circle(CROQUIS1_R)
    extrude(amount=SALIENTE_EXTRUIR1_15_DEPTH, both=True)


with BuildPart() as body_16:
    # Croquis1 → Saliente-Extruir1 16 (new, symmetric)
    with BuildSketch(Plane(origin=(0, 0, 0), x_dir=(1, 0, 0), z_dir=(0, 1, 0))):
        with Locations(Location((23.096988313, 9.567085809, 0), (0, 0, 270))):
            Circle(CROQUIS1_R)
    extrude(amount=SALIENTE_EXTRUIR1_16_DEPTH, both=True)


with BuildPart() as part_1:
    add(part.part)

    add(body_2.part)  # Saliente-Extruir2 merges body 2

    add(body_3.part)  # Saliente-Extruir2 merges body 3

    add(body_4.part)  # Saliente-Extruir2 merges body 4

    add(body_5.part)  # Saliente-Extruir2 merges body 5

    add(body_6.part)  # Saliente-Extruir2 merges body 6

    add(body_7.part)  # Saliente-Extruir2 merges body 7

    add(body_8.part)  # Saliente-Extruir2 merges body 8

    add(body_9.part)  # Saliente-Extruir2 merges body 9

    add(body_10.part)  # Saliente-Extruir2 merges body 10

    add(body_11.part)  # Saliente-Extruir2 merges body 11

    add(body_12.part)  # Saliente-Extruir2 merges body 12

    add(body_13.part)  # Saliente-Extruir2 merges body 13

    add(body_14.part)  # Saliente-Extruir2 merges body 14

    add(body_15.part)  # Saliente-Extruir2 merges body 15

    add(body_16.part)  # Saliente-Extruir2 merges body 16
    # Croquis3 → Saliente-Extruir2 (add, symmetric)
    with BuildSketch(Plane(origin=(0, 0, 0), x_dir=(1, 0, 0), z_dir=(0, 1, 0))):
        with Locations(Location((0, 0, 0), (0, 0, 270))):
            Circle(CROQUIS3_R)
        with Locations(Location((0, 0, 0), (0, 0, 270))):
            Circle(CROQUIS3_R_2, mode=Mode.SUBTRACT)
    extrude(amount=SALIENTE_EXTRUIR2_DEPTH, both=True)

    # Croquis4 → Cortar-Extruir1 (cut, through all)
    with BuildSketch(Plane(origin=(0, 6, 0), x_dir=(1, 0, 0), z_dir=(0, 1, 0))):
        with Locations(Location((27.5, 0, 0), (0, 0, 270))):
            Circle(CROQUIS4_R)
        with Locations(Location((17.145969551, -21.500365768, 0), (0, 0, 270))):
            Circle(CROQUIS4_R)
        with Locations(Location((-6.119325684, -26.810517585, 0), (0, 0, 270))):
            Circle(CROQUIS4_R)
        with Locations(Location((-24.776643867, -11.931802826, 0), (0, 0, 270))):
            Circle(CROQUIS4_R)
        with Locations(Location((-24.776643867, 11.931802826, 0), (0, 0, 270))):
            Circle(CROQUIS4_R)
        with Locations(Location((-6.119325684, 26.810517585, 0), (0, 0, 270))):
            Circle(CROQUIS4_R)
        with Locations(Location((17.145969551, 21.500365768, 0), (0, 0, 270))):
            Circle(CROQUIS4_R)
    extrude(amount=-CORTAR_EXTRUIR1_DEPTH, mode=Mode.SUBTRACT)


solid = part_1.part
